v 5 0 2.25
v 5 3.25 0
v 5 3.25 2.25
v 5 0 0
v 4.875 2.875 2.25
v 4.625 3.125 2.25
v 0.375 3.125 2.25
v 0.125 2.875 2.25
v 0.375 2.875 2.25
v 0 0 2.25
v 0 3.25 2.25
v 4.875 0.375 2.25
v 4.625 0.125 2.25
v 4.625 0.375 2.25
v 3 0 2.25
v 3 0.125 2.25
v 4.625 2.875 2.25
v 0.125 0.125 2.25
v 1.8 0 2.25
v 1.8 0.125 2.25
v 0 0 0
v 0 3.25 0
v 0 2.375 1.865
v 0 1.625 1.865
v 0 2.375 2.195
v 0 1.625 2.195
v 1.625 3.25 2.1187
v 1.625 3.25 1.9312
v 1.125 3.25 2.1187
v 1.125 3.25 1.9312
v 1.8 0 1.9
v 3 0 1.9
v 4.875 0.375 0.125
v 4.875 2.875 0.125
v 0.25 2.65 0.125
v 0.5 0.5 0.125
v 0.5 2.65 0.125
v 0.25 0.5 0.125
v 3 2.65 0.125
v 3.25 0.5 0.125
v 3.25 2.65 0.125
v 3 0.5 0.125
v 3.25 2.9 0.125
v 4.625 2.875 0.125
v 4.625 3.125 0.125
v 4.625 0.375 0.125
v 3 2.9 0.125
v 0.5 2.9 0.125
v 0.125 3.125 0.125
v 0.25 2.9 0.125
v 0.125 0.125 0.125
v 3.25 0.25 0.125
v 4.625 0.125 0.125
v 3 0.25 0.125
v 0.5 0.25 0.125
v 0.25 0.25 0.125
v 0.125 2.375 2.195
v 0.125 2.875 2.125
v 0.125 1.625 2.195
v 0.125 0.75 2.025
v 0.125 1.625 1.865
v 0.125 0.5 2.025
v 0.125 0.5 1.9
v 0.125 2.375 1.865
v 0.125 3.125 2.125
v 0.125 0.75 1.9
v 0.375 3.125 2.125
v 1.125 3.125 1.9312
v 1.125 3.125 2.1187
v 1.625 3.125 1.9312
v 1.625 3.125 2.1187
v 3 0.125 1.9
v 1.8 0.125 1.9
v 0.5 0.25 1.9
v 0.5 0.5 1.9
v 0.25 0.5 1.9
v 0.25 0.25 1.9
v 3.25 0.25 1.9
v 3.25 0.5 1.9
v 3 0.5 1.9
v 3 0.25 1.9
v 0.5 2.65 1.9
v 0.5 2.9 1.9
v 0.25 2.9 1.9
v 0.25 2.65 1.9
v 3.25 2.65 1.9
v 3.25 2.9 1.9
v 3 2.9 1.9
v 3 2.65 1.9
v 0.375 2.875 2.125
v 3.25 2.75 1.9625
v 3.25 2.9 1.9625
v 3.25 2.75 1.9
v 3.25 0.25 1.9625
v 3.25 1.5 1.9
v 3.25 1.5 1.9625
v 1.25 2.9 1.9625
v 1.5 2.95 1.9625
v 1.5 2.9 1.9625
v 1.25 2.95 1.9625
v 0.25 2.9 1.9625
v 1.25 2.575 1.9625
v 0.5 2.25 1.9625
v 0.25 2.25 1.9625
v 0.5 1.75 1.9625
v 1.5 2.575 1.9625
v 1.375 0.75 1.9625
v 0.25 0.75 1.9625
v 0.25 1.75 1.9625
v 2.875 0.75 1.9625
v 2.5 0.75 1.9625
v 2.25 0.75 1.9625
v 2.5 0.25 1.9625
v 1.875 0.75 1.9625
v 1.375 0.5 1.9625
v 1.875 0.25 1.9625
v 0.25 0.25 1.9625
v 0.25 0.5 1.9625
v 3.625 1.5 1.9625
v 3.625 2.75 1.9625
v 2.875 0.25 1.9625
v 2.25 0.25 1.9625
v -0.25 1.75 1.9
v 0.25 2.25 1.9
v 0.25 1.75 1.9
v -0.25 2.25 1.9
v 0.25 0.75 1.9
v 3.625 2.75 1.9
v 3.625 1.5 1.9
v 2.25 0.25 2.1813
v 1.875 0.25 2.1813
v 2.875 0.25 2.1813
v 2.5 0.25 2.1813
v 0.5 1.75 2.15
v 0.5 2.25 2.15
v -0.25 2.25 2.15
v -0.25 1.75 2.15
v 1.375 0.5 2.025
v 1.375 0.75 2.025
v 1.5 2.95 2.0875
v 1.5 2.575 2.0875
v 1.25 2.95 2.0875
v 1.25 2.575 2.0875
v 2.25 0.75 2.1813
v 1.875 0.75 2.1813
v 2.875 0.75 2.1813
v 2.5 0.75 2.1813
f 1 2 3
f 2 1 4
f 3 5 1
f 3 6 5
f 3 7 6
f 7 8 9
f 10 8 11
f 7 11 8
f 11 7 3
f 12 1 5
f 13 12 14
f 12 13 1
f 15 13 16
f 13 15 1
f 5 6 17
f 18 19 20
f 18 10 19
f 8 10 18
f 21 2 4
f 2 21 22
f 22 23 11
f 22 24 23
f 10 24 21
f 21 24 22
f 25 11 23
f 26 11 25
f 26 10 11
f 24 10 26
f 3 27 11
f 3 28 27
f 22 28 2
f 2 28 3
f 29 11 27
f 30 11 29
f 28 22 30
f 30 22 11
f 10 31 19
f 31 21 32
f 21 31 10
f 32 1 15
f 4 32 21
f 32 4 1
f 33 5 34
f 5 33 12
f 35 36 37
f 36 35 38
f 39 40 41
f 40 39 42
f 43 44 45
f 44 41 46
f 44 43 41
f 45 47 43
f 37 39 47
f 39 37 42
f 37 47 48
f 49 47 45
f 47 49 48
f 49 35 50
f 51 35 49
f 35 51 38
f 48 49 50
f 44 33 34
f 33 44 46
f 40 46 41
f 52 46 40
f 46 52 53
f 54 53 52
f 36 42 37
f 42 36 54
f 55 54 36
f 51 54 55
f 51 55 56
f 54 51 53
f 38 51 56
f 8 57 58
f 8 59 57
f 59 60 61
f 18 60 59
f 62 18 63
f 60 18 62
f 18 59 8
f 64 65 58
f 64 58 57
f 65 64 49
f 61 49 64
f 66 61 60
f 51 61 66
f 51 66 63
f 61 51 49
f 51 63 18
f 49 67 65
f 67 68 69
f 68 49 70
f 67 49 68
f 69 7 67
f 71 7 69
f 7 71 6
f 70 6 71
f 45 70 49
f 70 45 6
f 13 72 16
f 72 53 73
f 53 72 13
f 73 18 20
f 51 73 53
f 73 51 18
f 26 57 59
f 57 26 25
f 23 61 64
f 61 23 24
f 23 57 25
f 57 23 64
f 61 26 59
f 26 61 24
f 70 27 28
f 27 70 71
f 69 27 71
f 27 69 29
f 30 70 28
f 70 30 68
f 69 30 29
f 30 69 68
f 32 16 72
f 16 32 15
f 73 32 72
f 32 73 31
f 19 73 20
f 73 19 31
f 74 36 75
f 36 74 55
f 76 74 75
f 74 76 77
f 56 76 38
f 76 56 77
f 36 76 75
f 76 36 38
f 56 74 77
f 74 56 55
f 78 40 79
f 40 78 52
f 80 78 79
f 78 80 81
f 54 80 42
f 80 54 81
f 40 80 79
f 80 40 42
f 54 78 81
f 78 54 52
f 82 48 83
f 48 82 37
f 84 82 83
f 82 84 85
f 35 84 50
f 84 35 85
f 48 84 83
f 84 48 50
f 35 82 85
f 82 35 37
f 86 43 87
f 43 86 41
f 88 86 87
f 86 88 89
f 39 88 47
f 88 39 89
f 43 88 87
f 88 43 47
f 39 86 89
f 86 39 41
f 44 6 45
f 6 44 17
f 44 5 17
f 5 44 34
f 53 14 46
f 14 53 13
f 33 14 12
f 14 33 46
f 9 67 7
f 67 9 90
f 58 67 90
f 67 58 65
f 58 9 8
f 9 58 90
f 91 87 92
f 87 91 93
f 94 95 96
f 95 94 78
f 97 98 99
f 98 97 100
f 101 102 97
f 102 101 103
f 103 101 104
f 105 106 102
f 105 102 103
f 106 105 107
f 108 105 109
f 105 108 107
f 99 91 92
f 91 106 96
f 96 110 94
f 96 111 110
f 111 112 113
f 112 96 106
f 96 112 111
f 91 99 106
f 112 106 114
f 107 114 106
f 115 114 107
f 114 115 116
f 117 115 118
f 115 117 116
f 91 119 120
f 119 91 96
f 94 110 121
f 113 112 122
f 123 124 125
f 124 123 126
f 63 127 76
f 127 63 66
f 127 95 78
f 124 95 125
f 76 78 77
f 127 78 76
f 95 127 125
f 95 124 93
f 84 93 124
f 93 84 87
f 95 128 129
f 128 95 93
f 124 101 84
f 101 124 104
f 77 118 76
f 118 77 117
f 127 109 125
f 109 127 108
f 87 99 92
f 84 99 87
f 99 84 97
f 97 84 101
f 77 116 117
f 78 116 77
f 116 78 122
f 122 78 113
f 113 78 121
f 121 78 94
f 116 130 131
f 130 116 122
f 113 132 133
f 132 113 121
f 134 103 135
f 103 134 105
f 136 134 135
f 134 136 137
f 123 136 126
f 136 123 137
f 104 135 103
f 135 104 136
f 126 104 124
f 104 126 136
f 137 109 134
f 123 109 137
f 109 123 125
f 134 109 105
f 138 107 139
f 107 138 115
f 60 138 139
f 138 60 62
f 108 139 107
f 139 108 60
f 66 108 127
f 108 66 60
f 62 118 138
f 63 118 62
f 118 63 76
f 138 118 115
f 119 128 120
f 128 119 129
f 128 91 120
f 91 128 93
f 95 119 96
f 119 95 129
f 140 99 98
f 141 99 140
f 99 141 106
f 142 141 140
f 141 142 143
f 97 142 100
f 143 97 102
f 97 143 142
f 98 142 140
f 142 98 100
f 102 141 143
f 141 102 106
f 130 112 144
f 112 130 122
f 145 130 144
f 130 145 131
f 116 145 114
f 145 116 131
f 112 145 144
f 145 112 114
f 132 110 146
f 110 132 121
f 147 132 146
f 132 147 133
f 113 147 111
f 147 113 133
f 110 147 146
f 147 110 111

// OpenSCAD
color ([0, 0.5, 1]) union() {
    
    difference() { 
        cube([5, 3 + 1/4, 2 + 1/4]); 
        translate ([1/8, 1/8, 1/8]) cube([4 + 3/4, 3, 2.3]);
        translate([1/4-0.5, 1/4 + 1.375, 1.865]) cube([0.8, 0.75, 0.33]);
        translate([1 + 4/32, 3, 1.9+1/32]) cube([1/2, 7/16, 3/16]);
        translate([1.8, -0.1, 1.9]) cube([1.2, 1/2, 1/2]);
    };
    translate([1/4, 1/4, 0]) {
        translate([0, 0, 0]) cube([1/4, 1/4, 1.9]);
        translate([3-1/4, 0, 0]) cube([1/4, 1/4, 1.9]);
        translate([0, 2.65-1/4, 0]) cube([1/4, 1/4, 1.9]);
        translate([3-1/4, 2.65-1/4, 0]) cube([1/4, 1/4, 1.9]);
    }

    translate([4+5/8, 3-1/8, 0]) cube([1/4, 1/4, 2 + 1/4]);
    translate([4+5/8, 1/8, 0]) cube([1/4, 1/4, 2 + 1/4]);
    translate([1/8, 3-1/8, 2+1/8]) cube([1/4, 1/4, 1/8]);
}



 /**   
translate([0, 0, 2+1/4]) {
    color([0, 0.5, 1]) {
        difference() {
            cube ([5, 3+1/4, 1/8]);
            translate ([-1/16, -1/16, -1/16]) cube ([1.75, 1, 1/4]);
        }
    }
}
**/

translate([1/4, 1/4, 1.9]) {
    color([0, 1, 0]) cube ([3, 2.65, 1/16]);
    
    translate([-0.5, 1.5, 0]) color([0.5, 0.5, 0.5]) cube([0.75, 0.5, 0.25]);
    
    translate([-0.125, 0.25, 0]) color([0.1, 0.1, 0.2]) cube([1.25, 0.25, 0.125]);
    
    translate([3, 1.25, 0]) color([0.8, 0.8, 0.0]) cube([3/8, 1.25, 1/16]);
    
    translate([1, 2.7-3/8, 1/16]) color([0.5, 0.5, 0.5]) cube([1/4, 3/8, 1/8]);
    
    translate([1+10/16, 0, 1/16]) color([0.1, 0.1, 0.1]) cube([3/8, 1/2, 7/32]);
    
    translate([2+1/4, 0, 1/16]) color([0.1, 0.1, 0.1]) cube([3/8, 1/2, 7/32]);
}
